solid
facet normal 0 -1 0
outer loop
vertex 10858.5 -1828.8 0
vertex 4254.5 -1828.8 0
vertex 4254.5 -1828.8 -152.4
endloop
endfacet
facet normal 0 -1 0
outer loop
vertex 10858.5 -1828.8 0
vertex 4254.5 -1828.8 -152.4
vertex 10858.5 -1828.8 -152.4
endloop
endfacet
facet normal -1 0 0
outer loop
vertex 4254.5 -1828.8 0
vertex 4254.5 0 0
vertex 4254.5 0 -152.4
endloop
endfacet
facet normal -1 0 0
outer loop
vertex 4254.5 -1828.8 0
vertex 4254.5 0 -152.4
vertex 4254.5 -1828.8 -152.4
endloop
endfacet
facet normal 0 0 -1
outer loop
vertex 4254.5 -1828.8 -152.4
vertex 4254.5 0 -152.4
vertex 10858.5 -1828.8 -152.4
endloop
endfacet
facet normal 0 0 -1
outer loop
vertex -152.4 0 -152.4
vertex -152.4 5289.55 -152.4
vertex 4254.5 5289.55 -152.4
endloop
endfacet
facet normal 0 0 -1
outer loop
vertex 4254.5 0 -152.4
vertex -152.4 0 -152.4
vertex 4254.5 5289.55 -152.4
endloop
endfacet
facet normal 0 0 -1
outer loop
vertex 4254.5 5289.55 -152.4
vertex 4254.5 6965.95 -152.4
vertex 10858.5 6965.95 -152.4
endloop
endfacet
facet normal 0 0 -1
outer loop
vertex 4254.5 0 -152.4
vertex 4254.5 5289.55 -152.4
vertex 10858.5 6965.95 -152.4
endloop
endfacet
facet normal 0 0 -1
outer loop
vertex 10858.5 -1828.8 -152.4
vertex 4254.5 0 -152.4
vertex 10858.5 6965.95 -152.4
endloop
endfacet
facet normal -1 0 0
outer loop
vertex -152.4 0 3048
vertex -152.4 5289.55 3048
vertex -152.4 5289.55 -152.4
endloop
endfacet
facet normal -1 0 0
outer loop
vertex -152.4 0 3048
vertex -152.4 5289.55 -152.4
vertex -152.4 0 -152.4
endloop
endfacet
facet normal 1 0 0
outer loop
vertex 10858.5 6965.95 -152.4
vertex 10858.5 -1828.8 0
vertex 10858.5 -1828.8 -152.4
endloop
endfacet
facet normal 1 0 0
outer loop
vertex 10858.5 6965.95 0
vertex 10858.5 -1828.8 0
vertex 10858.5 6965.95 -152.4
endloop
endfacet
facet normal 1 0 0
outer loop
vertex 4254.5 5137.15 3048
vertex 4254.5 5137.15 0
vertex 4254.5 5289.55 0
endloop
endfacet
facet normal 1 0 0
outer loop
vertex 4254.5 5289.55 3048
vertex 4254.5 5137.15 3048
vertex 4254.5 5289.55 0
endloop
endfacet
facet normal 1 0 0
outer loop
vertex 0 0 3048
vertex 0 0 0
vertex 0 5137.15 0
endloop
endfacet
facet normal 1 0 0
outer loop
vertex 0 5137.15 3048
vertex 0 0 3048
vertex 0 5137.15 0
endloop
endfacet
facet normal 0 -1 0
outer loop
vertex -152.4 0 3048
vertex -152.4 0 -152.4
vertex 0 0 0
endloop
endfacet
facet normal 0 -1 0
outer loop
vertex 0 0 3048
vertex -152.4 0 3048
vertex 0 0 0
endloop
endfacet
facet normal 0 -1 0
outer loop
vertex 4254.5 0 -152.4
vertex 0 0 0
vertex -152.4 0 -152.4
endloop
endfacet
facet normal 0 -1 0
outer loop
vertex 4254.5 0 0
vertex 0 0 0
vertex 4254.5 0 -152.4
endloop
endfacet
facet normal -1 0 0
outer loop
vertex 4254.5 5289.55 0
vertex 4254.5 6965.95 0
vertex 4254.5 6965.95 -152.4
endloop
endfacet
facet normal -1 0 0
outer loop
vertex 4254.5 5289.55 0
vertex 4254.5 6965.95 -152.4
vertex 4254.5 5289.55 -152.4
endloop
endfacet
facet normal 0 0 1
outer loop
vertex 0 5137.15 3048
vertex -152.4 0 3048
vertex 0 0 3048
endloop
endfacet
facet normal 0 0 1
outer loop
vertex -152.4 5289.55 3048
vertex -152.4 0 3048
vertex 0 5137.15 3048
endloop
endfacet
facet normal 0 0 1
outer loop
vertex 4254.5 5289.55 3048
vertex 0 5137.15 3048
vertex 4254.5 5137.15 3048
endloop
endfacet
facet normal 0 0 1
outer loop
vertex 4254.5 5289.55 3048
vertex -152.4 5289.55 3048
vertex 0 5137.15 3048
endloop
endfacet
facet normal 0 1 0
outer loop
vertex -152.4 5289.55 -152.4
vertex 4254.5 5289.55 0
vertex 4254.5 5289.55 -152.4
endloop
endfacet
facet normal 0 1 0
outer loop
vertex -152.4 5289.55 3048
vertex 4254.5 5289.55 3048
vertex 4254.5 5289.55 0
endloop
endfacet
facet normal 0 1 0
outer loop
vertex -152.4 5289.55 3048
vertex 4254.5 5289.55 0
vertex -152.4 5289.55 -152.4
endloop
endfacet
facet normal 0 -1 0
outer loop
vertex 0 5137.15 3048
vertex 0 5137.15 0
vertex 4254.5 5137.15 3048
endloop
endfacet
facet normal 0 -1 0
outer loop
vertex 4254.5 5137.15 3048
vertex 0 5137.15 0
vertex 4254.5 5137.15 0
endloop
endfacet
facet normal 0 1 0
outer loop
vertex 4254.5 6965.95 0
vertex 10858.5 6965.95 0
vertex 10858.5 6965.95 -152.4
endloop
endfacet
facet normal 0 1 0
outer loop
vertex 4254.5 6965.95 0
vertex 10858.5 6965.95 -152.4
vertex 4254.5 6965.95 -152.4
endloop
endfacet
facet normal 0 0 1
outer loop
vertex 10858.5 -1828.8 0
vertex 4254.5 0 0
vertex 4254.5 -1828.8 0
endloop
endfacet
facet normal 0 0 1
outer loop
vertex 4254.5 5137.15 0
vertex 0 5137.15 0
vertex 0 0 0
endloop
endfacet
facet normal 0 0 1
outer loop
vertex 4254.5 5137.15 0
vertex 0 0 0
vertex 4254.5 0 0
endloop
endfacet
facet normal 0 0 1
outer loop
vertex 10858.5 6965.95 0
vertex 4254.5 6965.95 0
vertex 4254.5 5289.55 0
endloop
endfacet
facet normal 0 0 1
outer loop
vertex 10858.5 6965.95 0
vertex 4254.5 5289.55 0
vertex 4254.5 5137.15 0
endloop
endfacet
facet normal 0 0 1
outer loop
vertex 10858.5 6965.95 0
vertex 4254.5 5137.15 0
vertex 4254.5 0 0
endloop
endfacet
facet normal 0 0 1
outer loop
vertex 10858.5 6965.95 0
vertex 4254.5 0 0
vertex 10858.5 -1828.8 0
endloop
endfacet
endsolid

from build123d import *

# Parameters (mm, degrees)
F0_W     = 152.4
F0_H     = 5137.15
F1_DEPTH = 3048
F2_DEPTH = 152.4


with BuildPart() as f1:
    # F0 (on Top) → F1 (new body)
    with BuildSketch(Plane.XY):
        Polygon((-152.4, 5137.15), (0, 5137.15), (4254.5, 5137.15), (4254.5, 5289.55), (-152.4, 5289.55), align=None)
        with Locations((-76.2, 2568.575)):
            Rectangle(F0_W, F0_H)
    extrude(amount=F1_DEPTH)

    # F0 (on Top) → F2 (join)
    with BuildSketch(Plane.XY):
        Polygon((0, 5137.15), (0, 0), (4254.5, 0), (10858.5, 0), (10858.5, 5137.15), (4254.5, 5137.15), align=None)
        with Locations((-76.2, 2568.575)):
            Rectangle(F0_W, F0_H)
        Polygon((-152.4, 5137.15), (0, 5137.15), (4254.5, 5137.15), (4254.5, 5289.55), (-152.4, 5289.55), align=None)
        Polygon((10858.5, 0), (4254.5, 0), (4254.5, -152.4), (4254.5, -1828.8), (10858.5, -1828.8), align=None)
        Polygon((4254.5, 5289.55), (4254.5, 5137.15), (10858.5, 5137.15), (10858.5, 6965.95), (4254.5, 6965.95), align=None)
    extrude(amount=-F2_DEPTH)


solid = f1.part
